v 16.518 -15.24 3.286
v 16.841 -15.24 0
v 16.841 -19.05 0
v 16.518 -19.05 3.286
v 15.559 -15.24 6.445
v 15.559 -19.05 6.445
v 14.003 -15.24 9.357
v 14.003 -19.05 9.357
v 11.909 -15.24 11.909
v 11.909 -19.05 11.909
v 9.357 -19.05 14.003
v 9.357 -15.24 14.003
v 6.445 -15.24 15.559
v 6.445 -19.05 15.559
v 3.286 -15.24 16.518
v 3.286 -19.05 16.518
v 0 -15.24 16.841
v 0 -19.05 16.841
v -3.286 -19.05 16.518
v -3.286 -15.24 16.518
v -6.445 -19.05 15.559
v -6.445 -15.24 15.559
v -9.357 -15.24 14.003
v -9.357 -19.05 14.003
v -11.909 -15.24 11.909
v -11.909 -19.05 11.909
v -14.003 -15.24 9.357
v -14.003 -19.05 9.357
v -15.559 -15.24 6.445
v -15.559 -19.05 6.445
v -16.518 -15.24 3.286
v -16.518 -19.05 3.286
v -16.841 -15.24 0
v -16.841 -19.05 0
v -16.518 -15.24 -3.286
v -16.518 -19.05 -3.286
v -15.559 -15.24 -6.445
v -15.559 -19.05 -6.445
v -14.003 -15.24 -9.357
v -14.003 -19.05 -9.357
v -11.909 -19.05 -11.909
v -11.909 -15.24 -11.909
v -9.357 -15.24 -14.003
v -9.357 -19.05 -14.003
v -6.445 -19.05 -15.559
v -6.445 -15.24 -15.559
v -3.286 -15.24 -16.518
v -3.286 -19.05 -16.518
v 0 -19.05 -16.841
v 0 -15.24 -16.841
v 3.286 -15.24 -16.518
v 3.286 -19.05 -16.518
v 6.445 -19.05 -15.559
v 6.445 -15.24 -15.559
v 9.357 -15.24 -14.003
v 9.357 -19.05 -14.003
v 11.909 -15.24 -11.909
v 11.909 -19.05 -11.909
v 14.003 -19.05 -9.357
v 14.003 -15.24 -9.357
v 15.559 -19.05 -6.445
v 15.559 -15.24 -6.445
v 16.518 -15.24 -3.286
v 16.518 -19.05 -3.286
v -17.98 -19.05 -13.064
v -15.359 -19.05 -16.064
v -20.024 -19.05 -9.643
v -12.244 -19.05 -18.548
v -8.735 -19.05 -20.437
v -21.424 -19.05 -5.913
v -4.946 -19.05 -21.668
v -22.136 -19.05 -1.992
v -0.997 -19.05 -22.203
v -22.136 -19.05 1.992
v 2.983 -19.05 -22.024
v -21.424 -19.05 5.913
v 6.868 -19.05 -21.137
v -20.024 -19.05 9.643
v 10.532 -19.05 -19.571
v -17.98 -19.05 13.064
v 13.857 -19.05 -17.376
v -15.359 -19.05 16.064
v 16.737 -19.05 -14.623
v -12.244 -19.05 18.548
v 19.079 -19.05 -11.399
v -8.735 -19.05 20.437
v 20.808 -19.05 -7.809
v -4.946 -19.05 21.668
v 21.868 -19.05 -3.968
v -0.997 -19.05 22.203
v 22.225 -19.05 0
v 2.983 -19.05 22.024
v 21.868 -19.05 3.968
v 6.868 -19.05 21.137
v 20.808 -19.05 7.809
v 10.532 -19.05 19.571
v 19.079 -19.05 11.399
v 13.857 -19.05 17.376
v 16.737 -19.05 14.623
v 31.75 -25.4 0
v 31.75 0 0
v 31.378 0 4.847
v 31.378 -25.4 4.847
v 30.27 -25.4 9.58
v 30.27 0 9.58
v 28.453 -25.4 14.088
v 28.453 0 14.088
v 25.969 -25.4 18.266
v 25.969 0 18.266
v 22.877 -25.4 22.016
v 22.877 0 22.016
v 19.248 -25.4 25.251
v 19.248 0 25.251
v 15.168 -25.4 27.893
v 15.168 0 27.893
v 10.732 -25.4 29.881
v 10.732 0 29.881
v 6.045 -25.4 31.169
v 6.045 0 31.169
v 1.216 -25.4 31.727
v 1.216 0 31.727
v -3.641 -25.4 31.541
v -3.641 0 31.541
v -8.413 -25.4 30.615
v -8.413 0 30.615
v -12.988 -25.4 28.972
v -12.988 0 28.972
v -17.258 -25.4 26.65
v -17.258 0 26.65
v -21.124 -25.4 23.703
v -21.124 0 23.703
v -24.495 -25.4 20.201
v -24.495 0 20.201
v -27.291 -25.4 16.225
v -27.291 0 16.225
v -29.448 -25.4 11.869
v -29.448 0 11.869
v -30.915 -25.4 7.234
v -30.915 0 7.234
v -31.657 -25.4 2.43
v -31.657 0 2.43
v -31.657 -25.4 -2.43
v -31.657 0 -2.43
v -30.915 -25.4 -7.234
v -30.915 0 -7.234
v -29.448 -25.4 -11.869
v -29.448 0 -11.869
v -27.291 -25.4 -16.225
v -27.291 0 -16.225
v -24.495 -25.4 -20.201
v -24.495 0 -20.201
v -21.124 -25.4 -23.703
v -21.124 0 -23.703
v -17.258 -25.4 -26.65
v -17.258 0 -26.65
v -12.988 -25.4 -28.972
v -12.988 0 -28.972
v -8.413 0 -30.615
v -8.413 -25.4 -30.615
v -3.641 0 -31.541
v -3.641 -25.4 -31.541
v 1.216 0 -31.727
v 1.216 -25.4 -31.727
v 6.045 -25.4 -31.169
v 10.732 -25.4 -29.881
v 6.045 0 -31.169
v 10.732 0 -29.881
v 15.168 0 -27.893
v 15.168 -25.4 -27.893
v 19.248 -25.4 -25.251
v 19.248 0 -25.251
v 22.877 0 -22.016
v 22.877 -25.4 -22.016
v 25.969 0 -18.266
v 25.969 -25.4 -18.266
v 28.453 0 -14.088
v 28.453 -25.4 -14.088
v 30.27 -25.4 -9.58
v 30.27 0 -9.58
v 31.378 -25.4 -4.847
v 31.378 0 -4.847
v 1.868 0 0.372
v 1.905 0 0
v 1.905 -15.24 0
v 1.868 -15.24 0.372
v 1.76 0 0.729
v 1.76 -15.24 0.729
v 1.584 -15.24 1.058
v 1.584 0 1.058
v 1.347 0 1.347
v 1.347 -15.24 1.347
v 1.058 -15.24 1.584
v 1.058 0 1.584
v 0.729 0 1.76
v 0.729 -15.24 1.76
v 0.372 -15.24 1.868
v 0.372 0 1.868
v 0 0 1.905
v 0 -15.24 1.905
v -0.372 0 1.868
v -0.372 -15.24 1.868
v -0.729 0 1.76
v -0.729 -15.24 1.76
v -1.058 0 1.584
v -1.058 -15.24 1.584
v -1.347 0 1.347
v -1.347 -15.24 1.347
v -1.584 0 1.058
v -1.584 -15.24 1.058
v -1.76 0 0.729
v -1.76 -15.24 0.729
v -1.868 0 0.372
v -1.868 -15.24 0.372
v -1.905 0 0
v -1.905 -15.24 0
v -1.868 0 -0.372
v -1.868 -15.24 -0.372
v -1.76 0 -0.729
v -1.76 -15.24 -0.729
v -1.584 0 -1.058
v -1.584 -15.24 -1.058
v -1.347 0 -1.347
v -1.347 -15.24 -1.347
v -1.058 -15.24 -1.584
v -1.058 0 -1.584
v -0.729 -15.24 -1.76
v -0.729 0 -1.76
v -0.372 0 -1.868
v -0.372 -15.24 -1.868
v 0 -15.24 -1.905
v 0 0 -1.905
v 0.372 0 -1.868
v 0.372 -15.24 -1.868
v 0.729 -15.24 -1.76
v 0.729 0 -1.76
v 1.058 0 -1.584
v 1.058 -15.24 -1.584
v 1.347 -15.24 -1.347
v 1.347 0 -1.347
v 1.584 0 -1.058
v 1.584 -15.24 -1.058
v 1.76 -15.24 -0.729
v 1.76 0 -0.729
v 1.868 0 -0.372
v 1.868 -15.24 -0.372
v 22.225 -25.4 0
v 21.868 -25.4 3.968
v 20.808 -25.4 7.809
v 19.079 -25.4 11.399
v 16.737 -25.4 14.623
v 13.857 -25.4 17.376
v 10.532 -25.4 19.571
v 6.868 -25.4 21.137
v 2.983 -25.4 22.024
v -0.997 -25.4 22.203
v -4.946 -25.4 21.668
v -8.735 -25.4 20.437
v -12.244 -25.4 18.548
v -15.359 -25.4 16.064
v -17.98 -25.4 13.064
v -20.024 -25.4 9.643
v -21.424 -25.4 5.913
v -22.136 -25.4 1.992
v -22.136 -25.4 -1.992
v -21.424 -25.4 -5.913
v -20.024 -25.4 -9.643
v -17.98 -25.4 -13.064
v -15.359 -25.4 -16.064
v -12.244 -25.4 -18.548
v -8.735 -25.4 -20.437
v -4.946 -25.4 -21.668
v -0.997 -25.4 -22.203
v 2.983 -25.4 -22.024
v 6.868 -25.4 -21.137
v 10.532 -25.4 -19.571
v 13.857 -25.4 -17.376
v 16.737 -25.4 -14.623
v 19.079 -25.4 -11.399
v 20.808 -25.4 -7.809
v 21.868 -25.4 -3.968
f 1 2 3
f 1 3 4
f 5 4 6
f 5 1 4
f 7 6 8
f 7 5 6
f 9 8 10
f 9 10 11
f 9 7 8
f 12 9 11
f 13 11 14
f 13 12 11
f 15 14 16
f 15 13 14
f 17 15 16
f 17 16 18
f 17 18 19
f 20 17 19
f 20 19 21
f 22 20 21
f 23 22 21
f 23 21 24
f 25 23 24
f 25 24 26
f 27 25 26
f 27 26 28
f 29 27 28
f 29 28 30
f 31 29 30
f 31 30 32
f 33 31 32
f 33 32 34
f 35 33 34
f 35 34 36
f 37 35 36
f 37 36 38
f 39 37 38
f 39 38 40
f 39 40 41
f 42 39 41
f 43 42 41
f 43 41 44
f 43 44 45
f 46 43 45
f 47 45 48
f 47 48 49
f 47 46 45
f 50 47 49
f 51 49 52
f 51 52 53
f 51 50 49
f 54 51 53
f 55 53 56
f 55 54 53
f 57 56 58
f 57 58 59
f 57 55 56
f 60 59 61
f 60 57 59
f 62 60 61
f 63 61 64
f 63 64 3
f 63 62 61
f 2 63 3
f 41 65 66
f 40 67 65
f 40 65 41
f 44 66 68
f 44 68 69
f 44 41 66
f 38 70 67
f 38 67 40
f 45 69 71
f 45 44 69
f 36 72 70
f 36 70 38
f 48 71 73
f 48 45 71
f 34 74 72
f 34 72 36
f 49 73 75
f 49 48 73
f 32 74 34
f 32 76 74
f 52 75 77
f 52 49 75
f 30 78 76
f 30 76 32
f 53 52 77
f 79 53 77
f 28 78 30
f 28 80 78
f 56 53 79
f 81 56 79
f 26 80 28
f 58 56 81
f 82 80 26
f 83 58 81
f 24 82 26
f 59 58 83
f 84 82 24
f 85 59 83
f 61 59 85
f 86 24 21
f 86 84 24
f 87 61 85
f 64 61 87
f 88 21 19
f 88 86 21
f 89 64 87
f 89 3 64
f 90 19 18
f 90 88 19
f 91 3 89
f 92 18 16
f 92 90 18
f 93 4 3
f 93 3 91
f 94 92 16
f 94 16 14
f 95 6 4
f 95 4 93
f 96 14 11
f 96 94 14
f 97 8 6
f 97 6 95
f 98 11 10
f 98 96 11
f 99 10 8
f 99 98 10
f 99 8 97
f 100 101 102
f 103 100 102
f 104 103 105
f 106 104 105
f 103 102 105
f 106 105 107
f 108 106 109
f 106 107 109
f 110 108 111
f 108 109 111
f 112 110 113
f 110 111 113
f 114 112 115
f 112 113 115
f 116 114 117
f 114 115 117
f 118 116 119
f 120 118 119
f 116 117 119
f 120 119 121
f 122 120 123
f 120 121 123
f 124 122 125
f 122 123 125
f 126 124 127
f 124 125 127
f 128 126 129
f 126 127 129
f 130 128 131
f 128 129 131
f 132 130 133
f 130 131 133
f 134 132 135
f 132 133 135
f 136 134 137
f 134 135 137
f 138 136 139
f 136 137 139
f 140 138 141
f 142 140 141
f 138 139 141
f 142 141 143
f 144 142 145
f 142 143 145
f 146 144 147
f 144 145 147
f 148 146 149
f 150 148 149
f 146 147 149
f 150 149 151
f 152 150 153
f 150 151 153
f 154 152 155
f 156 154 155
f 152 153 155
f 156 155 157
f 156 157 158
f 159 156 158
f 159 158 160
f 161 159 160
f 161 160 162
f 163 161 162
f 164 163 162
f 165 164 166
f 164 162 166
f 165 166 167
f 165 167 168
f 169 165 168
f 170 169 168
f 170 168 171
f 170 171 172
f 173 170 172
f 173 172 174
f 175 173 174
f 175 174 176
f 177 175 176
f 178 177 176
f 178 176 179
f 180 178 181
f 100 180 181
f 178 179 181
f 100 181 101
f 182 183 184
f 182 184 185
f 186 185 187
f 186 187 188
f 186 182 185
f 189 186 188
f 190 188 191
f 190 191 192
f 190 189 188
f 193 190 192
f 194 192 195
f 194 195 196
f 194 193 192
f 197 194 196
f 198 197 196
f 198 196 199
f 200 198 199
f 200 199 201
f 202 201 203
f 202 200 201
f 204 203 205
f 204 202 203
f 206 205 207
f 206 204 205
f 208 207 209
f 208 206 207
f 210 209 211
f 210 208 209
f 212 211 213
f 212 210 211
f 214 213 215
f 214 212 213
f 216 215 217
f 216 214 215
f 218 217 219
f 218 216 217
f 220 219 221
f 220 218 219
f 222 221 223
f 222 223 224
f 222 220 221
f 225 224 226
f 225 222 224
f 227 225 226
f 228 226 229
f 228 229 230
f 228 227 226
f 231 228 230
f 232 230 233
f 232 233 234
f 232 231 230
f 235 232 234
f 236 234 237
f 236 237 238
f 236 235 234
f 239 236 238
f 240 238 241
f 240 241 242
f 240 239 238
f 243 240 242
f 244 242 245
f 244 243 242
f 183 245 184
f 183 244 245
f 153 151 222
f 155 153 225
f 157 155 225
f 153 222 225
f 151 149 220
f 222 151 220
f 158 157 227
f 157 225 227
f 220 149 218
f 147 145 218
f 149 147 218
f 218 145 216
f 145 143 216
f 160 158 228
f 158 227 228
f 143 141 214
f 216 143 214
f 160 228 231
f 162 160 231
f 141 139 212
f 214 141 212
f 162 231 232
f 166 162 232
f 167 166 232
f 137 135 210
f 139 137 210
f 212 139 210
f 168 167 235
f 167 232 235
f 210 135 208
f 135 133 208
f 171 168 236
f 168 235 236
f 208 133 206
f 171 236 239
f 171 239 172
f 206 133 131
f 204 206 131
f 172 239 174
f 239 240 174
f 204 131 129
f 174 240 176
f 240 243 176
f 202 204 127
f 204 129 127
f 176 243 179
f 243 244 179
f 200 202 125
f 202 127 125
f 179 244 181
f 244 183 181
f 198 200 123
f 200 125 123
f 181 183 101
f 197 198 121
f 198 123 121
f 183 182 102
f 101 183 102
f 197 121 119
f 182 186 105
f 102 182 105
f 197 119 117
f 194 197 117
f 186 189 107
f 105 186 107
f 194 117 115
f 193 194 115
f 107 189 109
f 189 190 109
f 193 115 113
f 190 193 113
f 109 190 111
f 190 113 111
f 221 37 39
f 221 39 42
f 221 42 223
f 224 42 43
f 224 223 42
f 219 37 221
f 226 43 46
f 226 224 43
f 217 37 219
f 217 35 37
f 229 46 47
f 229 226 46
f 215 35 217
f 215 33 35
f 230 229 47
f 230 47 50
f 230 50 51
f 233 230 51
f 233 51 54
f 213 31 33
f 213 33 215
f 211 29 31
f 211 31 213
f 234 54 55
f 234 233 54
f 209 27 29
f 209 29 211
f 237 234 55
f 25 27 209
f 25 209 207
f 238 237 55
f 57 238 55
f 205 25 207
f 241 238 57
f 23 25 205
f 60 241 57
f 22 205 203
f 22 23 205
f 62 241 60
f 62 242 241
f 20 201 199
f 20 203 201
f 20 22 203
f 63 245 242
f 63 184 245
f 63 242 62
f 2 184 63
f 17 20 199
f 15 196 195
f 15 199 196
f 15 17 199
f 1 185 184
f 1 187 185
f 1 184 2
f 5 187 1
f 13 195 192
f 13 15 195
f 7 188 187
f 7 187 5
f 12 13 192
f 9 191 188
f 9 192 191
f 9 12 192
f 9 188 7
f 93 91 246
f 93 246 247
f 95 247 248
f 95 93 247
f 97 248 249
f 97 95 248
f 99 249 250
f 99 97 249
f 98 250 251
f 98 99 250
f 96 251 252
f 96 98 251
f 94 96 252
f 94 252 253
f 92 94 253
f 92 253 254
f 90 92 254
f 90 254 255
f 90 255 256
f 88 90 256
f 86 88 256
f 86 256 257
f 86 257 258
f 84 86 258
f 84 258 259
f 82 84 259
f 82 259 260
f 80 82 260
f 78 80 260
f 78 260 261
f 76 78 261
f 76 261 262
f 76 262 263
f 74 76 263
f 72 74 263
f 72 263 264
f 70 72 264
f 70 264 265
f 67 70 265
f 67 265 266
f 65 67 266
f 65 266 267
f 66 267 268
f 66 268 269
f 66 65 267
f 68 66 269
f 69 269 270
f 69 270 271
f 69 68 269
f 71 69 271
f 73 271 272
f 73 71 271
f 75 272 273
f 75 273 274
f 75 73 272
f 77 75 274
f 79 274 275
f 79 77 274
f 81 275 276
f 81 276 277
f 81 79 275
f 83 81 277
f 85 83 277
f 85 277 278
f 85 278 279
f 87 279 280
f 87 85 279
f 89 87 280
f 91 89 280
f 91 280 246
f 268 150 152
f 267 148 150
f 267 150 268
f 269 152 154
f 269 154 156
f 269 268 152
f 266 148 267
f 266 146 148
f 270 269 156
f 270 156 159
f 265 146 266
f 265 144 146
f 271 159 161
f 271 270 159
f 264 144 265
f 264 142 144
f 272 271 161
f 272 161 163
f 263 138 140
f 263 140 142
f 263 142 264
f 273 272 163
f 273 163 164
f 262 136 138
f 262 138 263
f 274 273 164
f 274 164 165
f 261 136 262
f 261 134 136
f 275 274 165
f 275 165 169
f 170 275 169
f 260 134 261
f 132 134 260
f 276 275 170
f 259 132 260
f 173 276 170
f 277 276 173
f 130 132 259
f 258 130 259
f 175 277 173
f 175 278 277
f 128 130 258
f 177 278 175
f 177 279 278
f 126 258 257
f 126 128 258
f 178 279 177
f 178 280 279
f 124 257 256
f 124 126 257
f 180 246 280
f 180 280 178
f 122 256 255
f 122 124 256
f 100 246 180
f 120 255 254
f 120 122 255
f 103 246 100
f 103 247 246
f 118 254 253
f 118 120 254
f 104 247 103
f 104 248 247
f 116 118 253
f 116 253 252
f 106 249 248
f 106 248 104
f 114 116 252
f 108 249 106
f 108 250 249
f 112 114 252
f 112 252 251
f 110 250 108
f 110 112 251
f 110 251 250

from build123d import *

# Parameters (mm, degrees)
F0_R     = 22.225
F0_R_2   = 16.8413804611
F1_DEPTH = 19.05
F0_R_3   = 31.75
F2_DEPTH = 25.4
F0_R_4   = 1.905
F4_DEPTH = 15.24


# Not quite as in the source:
# - the program builds the solid bodies; features that only make, move or delete a surface that nothing else refers to are left out


with BuildPart() as f1:
    # F0 (on Front) → F1 (new body)
    with BuildSketch(Plane.XZ):
        Circle(F0_R)
        Circle(F0_R_2, mode=Mode.SUBTRACT)
    extrude(amount=F1_DEPTH)

    # F0 (on Front) → F2 (join)
    with BuildSketch(Plane.XZ):
        Circle(F0_R_3)
        Circle(F0_R, mode=Mode.SUBTRACT)
    extrude(amount=F2_DEPTH)

    # F0 (on Front) → F4 (join)
    with BuildSketch(Plane.XZ):
        Circle(F0_R_2)
        Circle(F0_R_4, mode=Mode.SUBTRACT)
    extrude(amount=F4_DEPTH)


solid = f1.part
